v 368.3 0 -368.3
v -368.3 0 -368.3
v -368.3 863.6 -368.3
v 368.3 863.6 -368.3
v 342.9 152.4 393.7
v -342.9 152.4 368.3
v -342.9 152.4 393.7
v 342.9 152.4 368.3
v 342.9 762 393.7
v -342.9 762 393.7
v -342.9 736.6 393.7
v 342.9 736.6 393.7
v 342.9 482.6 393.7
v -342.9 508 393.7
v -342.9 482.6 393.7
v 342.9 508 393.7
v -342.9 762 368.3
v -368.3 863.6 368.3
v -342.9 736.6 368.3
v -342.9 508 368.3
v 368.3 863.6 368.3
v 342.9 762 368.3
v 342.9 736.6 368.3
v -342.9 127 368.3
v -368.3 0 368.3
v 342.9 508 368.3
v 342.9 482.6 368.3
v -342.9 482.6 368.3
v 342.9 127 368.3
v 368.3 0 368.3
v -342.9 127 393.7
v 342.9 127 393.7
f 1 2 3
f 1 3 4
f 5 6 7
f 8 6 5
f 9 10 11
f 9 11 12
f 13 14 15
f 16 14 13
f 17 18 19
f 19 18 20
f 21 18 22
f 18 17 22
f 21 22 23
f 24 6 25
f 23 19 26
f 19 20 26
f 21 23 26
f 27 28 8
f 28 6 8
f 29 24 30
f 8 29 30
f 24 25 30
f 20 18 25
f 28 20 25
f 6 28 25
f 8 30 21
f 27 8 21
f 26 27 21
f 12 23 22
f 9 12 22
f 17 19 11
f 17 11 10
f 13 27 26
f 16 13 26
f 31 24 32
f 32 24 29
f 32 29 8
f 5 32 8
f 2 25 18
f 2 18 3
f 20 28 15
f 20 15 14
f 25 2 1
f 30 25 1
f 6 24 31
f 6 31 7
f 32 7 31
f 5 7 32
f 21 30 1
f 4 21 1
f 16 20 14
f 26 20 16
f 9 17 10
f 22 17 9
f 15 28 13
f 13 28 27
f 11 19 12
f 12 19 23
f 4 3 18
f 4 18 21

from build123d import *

# Parameters (mm, degrees)
SKETCH1_W           = 736.6
SKETCH1_H           = 736.6
BOSS_EXTRUDE1_DEPTH = 863.6
SKETCH2_W           = 685.8
SKETCH2_H           = 25.4
BOSS_EXTRUDE2_DEPTH = 25.4


with BuildPart() as part:
    # Sketch1 → Boss-Extrude1 (new body)
    with BuildSketch(Plane(origin=(0, 0, 0), x_dir=(1, 0, 0), z_dir=(0, 1, 0))):
        Rectangle(SKETCH1_W, SKETCH1_H)
    extrude(amount=BOSS_EXTRUDE1_DEPTH)

    # Sketch2 → Boss-Extrude2 (add)
    with BuildSketch(Plane.XY.offset(368.3)):
        with Locations((0, 749.3)):
            Rectangle(SKETCH2_W, SKETCH2_H)
        with Locations((0, 495.3)):
            Rectangle(SKETCH2_W, SKETCH2_H)
        with Locations((0, 139.7)):
            Rectangle(SKETCH2_W, SKETCH2_H)
    extrude(amount=BOSS_EXTRUDE2_DEPTH)


solid = part.part
